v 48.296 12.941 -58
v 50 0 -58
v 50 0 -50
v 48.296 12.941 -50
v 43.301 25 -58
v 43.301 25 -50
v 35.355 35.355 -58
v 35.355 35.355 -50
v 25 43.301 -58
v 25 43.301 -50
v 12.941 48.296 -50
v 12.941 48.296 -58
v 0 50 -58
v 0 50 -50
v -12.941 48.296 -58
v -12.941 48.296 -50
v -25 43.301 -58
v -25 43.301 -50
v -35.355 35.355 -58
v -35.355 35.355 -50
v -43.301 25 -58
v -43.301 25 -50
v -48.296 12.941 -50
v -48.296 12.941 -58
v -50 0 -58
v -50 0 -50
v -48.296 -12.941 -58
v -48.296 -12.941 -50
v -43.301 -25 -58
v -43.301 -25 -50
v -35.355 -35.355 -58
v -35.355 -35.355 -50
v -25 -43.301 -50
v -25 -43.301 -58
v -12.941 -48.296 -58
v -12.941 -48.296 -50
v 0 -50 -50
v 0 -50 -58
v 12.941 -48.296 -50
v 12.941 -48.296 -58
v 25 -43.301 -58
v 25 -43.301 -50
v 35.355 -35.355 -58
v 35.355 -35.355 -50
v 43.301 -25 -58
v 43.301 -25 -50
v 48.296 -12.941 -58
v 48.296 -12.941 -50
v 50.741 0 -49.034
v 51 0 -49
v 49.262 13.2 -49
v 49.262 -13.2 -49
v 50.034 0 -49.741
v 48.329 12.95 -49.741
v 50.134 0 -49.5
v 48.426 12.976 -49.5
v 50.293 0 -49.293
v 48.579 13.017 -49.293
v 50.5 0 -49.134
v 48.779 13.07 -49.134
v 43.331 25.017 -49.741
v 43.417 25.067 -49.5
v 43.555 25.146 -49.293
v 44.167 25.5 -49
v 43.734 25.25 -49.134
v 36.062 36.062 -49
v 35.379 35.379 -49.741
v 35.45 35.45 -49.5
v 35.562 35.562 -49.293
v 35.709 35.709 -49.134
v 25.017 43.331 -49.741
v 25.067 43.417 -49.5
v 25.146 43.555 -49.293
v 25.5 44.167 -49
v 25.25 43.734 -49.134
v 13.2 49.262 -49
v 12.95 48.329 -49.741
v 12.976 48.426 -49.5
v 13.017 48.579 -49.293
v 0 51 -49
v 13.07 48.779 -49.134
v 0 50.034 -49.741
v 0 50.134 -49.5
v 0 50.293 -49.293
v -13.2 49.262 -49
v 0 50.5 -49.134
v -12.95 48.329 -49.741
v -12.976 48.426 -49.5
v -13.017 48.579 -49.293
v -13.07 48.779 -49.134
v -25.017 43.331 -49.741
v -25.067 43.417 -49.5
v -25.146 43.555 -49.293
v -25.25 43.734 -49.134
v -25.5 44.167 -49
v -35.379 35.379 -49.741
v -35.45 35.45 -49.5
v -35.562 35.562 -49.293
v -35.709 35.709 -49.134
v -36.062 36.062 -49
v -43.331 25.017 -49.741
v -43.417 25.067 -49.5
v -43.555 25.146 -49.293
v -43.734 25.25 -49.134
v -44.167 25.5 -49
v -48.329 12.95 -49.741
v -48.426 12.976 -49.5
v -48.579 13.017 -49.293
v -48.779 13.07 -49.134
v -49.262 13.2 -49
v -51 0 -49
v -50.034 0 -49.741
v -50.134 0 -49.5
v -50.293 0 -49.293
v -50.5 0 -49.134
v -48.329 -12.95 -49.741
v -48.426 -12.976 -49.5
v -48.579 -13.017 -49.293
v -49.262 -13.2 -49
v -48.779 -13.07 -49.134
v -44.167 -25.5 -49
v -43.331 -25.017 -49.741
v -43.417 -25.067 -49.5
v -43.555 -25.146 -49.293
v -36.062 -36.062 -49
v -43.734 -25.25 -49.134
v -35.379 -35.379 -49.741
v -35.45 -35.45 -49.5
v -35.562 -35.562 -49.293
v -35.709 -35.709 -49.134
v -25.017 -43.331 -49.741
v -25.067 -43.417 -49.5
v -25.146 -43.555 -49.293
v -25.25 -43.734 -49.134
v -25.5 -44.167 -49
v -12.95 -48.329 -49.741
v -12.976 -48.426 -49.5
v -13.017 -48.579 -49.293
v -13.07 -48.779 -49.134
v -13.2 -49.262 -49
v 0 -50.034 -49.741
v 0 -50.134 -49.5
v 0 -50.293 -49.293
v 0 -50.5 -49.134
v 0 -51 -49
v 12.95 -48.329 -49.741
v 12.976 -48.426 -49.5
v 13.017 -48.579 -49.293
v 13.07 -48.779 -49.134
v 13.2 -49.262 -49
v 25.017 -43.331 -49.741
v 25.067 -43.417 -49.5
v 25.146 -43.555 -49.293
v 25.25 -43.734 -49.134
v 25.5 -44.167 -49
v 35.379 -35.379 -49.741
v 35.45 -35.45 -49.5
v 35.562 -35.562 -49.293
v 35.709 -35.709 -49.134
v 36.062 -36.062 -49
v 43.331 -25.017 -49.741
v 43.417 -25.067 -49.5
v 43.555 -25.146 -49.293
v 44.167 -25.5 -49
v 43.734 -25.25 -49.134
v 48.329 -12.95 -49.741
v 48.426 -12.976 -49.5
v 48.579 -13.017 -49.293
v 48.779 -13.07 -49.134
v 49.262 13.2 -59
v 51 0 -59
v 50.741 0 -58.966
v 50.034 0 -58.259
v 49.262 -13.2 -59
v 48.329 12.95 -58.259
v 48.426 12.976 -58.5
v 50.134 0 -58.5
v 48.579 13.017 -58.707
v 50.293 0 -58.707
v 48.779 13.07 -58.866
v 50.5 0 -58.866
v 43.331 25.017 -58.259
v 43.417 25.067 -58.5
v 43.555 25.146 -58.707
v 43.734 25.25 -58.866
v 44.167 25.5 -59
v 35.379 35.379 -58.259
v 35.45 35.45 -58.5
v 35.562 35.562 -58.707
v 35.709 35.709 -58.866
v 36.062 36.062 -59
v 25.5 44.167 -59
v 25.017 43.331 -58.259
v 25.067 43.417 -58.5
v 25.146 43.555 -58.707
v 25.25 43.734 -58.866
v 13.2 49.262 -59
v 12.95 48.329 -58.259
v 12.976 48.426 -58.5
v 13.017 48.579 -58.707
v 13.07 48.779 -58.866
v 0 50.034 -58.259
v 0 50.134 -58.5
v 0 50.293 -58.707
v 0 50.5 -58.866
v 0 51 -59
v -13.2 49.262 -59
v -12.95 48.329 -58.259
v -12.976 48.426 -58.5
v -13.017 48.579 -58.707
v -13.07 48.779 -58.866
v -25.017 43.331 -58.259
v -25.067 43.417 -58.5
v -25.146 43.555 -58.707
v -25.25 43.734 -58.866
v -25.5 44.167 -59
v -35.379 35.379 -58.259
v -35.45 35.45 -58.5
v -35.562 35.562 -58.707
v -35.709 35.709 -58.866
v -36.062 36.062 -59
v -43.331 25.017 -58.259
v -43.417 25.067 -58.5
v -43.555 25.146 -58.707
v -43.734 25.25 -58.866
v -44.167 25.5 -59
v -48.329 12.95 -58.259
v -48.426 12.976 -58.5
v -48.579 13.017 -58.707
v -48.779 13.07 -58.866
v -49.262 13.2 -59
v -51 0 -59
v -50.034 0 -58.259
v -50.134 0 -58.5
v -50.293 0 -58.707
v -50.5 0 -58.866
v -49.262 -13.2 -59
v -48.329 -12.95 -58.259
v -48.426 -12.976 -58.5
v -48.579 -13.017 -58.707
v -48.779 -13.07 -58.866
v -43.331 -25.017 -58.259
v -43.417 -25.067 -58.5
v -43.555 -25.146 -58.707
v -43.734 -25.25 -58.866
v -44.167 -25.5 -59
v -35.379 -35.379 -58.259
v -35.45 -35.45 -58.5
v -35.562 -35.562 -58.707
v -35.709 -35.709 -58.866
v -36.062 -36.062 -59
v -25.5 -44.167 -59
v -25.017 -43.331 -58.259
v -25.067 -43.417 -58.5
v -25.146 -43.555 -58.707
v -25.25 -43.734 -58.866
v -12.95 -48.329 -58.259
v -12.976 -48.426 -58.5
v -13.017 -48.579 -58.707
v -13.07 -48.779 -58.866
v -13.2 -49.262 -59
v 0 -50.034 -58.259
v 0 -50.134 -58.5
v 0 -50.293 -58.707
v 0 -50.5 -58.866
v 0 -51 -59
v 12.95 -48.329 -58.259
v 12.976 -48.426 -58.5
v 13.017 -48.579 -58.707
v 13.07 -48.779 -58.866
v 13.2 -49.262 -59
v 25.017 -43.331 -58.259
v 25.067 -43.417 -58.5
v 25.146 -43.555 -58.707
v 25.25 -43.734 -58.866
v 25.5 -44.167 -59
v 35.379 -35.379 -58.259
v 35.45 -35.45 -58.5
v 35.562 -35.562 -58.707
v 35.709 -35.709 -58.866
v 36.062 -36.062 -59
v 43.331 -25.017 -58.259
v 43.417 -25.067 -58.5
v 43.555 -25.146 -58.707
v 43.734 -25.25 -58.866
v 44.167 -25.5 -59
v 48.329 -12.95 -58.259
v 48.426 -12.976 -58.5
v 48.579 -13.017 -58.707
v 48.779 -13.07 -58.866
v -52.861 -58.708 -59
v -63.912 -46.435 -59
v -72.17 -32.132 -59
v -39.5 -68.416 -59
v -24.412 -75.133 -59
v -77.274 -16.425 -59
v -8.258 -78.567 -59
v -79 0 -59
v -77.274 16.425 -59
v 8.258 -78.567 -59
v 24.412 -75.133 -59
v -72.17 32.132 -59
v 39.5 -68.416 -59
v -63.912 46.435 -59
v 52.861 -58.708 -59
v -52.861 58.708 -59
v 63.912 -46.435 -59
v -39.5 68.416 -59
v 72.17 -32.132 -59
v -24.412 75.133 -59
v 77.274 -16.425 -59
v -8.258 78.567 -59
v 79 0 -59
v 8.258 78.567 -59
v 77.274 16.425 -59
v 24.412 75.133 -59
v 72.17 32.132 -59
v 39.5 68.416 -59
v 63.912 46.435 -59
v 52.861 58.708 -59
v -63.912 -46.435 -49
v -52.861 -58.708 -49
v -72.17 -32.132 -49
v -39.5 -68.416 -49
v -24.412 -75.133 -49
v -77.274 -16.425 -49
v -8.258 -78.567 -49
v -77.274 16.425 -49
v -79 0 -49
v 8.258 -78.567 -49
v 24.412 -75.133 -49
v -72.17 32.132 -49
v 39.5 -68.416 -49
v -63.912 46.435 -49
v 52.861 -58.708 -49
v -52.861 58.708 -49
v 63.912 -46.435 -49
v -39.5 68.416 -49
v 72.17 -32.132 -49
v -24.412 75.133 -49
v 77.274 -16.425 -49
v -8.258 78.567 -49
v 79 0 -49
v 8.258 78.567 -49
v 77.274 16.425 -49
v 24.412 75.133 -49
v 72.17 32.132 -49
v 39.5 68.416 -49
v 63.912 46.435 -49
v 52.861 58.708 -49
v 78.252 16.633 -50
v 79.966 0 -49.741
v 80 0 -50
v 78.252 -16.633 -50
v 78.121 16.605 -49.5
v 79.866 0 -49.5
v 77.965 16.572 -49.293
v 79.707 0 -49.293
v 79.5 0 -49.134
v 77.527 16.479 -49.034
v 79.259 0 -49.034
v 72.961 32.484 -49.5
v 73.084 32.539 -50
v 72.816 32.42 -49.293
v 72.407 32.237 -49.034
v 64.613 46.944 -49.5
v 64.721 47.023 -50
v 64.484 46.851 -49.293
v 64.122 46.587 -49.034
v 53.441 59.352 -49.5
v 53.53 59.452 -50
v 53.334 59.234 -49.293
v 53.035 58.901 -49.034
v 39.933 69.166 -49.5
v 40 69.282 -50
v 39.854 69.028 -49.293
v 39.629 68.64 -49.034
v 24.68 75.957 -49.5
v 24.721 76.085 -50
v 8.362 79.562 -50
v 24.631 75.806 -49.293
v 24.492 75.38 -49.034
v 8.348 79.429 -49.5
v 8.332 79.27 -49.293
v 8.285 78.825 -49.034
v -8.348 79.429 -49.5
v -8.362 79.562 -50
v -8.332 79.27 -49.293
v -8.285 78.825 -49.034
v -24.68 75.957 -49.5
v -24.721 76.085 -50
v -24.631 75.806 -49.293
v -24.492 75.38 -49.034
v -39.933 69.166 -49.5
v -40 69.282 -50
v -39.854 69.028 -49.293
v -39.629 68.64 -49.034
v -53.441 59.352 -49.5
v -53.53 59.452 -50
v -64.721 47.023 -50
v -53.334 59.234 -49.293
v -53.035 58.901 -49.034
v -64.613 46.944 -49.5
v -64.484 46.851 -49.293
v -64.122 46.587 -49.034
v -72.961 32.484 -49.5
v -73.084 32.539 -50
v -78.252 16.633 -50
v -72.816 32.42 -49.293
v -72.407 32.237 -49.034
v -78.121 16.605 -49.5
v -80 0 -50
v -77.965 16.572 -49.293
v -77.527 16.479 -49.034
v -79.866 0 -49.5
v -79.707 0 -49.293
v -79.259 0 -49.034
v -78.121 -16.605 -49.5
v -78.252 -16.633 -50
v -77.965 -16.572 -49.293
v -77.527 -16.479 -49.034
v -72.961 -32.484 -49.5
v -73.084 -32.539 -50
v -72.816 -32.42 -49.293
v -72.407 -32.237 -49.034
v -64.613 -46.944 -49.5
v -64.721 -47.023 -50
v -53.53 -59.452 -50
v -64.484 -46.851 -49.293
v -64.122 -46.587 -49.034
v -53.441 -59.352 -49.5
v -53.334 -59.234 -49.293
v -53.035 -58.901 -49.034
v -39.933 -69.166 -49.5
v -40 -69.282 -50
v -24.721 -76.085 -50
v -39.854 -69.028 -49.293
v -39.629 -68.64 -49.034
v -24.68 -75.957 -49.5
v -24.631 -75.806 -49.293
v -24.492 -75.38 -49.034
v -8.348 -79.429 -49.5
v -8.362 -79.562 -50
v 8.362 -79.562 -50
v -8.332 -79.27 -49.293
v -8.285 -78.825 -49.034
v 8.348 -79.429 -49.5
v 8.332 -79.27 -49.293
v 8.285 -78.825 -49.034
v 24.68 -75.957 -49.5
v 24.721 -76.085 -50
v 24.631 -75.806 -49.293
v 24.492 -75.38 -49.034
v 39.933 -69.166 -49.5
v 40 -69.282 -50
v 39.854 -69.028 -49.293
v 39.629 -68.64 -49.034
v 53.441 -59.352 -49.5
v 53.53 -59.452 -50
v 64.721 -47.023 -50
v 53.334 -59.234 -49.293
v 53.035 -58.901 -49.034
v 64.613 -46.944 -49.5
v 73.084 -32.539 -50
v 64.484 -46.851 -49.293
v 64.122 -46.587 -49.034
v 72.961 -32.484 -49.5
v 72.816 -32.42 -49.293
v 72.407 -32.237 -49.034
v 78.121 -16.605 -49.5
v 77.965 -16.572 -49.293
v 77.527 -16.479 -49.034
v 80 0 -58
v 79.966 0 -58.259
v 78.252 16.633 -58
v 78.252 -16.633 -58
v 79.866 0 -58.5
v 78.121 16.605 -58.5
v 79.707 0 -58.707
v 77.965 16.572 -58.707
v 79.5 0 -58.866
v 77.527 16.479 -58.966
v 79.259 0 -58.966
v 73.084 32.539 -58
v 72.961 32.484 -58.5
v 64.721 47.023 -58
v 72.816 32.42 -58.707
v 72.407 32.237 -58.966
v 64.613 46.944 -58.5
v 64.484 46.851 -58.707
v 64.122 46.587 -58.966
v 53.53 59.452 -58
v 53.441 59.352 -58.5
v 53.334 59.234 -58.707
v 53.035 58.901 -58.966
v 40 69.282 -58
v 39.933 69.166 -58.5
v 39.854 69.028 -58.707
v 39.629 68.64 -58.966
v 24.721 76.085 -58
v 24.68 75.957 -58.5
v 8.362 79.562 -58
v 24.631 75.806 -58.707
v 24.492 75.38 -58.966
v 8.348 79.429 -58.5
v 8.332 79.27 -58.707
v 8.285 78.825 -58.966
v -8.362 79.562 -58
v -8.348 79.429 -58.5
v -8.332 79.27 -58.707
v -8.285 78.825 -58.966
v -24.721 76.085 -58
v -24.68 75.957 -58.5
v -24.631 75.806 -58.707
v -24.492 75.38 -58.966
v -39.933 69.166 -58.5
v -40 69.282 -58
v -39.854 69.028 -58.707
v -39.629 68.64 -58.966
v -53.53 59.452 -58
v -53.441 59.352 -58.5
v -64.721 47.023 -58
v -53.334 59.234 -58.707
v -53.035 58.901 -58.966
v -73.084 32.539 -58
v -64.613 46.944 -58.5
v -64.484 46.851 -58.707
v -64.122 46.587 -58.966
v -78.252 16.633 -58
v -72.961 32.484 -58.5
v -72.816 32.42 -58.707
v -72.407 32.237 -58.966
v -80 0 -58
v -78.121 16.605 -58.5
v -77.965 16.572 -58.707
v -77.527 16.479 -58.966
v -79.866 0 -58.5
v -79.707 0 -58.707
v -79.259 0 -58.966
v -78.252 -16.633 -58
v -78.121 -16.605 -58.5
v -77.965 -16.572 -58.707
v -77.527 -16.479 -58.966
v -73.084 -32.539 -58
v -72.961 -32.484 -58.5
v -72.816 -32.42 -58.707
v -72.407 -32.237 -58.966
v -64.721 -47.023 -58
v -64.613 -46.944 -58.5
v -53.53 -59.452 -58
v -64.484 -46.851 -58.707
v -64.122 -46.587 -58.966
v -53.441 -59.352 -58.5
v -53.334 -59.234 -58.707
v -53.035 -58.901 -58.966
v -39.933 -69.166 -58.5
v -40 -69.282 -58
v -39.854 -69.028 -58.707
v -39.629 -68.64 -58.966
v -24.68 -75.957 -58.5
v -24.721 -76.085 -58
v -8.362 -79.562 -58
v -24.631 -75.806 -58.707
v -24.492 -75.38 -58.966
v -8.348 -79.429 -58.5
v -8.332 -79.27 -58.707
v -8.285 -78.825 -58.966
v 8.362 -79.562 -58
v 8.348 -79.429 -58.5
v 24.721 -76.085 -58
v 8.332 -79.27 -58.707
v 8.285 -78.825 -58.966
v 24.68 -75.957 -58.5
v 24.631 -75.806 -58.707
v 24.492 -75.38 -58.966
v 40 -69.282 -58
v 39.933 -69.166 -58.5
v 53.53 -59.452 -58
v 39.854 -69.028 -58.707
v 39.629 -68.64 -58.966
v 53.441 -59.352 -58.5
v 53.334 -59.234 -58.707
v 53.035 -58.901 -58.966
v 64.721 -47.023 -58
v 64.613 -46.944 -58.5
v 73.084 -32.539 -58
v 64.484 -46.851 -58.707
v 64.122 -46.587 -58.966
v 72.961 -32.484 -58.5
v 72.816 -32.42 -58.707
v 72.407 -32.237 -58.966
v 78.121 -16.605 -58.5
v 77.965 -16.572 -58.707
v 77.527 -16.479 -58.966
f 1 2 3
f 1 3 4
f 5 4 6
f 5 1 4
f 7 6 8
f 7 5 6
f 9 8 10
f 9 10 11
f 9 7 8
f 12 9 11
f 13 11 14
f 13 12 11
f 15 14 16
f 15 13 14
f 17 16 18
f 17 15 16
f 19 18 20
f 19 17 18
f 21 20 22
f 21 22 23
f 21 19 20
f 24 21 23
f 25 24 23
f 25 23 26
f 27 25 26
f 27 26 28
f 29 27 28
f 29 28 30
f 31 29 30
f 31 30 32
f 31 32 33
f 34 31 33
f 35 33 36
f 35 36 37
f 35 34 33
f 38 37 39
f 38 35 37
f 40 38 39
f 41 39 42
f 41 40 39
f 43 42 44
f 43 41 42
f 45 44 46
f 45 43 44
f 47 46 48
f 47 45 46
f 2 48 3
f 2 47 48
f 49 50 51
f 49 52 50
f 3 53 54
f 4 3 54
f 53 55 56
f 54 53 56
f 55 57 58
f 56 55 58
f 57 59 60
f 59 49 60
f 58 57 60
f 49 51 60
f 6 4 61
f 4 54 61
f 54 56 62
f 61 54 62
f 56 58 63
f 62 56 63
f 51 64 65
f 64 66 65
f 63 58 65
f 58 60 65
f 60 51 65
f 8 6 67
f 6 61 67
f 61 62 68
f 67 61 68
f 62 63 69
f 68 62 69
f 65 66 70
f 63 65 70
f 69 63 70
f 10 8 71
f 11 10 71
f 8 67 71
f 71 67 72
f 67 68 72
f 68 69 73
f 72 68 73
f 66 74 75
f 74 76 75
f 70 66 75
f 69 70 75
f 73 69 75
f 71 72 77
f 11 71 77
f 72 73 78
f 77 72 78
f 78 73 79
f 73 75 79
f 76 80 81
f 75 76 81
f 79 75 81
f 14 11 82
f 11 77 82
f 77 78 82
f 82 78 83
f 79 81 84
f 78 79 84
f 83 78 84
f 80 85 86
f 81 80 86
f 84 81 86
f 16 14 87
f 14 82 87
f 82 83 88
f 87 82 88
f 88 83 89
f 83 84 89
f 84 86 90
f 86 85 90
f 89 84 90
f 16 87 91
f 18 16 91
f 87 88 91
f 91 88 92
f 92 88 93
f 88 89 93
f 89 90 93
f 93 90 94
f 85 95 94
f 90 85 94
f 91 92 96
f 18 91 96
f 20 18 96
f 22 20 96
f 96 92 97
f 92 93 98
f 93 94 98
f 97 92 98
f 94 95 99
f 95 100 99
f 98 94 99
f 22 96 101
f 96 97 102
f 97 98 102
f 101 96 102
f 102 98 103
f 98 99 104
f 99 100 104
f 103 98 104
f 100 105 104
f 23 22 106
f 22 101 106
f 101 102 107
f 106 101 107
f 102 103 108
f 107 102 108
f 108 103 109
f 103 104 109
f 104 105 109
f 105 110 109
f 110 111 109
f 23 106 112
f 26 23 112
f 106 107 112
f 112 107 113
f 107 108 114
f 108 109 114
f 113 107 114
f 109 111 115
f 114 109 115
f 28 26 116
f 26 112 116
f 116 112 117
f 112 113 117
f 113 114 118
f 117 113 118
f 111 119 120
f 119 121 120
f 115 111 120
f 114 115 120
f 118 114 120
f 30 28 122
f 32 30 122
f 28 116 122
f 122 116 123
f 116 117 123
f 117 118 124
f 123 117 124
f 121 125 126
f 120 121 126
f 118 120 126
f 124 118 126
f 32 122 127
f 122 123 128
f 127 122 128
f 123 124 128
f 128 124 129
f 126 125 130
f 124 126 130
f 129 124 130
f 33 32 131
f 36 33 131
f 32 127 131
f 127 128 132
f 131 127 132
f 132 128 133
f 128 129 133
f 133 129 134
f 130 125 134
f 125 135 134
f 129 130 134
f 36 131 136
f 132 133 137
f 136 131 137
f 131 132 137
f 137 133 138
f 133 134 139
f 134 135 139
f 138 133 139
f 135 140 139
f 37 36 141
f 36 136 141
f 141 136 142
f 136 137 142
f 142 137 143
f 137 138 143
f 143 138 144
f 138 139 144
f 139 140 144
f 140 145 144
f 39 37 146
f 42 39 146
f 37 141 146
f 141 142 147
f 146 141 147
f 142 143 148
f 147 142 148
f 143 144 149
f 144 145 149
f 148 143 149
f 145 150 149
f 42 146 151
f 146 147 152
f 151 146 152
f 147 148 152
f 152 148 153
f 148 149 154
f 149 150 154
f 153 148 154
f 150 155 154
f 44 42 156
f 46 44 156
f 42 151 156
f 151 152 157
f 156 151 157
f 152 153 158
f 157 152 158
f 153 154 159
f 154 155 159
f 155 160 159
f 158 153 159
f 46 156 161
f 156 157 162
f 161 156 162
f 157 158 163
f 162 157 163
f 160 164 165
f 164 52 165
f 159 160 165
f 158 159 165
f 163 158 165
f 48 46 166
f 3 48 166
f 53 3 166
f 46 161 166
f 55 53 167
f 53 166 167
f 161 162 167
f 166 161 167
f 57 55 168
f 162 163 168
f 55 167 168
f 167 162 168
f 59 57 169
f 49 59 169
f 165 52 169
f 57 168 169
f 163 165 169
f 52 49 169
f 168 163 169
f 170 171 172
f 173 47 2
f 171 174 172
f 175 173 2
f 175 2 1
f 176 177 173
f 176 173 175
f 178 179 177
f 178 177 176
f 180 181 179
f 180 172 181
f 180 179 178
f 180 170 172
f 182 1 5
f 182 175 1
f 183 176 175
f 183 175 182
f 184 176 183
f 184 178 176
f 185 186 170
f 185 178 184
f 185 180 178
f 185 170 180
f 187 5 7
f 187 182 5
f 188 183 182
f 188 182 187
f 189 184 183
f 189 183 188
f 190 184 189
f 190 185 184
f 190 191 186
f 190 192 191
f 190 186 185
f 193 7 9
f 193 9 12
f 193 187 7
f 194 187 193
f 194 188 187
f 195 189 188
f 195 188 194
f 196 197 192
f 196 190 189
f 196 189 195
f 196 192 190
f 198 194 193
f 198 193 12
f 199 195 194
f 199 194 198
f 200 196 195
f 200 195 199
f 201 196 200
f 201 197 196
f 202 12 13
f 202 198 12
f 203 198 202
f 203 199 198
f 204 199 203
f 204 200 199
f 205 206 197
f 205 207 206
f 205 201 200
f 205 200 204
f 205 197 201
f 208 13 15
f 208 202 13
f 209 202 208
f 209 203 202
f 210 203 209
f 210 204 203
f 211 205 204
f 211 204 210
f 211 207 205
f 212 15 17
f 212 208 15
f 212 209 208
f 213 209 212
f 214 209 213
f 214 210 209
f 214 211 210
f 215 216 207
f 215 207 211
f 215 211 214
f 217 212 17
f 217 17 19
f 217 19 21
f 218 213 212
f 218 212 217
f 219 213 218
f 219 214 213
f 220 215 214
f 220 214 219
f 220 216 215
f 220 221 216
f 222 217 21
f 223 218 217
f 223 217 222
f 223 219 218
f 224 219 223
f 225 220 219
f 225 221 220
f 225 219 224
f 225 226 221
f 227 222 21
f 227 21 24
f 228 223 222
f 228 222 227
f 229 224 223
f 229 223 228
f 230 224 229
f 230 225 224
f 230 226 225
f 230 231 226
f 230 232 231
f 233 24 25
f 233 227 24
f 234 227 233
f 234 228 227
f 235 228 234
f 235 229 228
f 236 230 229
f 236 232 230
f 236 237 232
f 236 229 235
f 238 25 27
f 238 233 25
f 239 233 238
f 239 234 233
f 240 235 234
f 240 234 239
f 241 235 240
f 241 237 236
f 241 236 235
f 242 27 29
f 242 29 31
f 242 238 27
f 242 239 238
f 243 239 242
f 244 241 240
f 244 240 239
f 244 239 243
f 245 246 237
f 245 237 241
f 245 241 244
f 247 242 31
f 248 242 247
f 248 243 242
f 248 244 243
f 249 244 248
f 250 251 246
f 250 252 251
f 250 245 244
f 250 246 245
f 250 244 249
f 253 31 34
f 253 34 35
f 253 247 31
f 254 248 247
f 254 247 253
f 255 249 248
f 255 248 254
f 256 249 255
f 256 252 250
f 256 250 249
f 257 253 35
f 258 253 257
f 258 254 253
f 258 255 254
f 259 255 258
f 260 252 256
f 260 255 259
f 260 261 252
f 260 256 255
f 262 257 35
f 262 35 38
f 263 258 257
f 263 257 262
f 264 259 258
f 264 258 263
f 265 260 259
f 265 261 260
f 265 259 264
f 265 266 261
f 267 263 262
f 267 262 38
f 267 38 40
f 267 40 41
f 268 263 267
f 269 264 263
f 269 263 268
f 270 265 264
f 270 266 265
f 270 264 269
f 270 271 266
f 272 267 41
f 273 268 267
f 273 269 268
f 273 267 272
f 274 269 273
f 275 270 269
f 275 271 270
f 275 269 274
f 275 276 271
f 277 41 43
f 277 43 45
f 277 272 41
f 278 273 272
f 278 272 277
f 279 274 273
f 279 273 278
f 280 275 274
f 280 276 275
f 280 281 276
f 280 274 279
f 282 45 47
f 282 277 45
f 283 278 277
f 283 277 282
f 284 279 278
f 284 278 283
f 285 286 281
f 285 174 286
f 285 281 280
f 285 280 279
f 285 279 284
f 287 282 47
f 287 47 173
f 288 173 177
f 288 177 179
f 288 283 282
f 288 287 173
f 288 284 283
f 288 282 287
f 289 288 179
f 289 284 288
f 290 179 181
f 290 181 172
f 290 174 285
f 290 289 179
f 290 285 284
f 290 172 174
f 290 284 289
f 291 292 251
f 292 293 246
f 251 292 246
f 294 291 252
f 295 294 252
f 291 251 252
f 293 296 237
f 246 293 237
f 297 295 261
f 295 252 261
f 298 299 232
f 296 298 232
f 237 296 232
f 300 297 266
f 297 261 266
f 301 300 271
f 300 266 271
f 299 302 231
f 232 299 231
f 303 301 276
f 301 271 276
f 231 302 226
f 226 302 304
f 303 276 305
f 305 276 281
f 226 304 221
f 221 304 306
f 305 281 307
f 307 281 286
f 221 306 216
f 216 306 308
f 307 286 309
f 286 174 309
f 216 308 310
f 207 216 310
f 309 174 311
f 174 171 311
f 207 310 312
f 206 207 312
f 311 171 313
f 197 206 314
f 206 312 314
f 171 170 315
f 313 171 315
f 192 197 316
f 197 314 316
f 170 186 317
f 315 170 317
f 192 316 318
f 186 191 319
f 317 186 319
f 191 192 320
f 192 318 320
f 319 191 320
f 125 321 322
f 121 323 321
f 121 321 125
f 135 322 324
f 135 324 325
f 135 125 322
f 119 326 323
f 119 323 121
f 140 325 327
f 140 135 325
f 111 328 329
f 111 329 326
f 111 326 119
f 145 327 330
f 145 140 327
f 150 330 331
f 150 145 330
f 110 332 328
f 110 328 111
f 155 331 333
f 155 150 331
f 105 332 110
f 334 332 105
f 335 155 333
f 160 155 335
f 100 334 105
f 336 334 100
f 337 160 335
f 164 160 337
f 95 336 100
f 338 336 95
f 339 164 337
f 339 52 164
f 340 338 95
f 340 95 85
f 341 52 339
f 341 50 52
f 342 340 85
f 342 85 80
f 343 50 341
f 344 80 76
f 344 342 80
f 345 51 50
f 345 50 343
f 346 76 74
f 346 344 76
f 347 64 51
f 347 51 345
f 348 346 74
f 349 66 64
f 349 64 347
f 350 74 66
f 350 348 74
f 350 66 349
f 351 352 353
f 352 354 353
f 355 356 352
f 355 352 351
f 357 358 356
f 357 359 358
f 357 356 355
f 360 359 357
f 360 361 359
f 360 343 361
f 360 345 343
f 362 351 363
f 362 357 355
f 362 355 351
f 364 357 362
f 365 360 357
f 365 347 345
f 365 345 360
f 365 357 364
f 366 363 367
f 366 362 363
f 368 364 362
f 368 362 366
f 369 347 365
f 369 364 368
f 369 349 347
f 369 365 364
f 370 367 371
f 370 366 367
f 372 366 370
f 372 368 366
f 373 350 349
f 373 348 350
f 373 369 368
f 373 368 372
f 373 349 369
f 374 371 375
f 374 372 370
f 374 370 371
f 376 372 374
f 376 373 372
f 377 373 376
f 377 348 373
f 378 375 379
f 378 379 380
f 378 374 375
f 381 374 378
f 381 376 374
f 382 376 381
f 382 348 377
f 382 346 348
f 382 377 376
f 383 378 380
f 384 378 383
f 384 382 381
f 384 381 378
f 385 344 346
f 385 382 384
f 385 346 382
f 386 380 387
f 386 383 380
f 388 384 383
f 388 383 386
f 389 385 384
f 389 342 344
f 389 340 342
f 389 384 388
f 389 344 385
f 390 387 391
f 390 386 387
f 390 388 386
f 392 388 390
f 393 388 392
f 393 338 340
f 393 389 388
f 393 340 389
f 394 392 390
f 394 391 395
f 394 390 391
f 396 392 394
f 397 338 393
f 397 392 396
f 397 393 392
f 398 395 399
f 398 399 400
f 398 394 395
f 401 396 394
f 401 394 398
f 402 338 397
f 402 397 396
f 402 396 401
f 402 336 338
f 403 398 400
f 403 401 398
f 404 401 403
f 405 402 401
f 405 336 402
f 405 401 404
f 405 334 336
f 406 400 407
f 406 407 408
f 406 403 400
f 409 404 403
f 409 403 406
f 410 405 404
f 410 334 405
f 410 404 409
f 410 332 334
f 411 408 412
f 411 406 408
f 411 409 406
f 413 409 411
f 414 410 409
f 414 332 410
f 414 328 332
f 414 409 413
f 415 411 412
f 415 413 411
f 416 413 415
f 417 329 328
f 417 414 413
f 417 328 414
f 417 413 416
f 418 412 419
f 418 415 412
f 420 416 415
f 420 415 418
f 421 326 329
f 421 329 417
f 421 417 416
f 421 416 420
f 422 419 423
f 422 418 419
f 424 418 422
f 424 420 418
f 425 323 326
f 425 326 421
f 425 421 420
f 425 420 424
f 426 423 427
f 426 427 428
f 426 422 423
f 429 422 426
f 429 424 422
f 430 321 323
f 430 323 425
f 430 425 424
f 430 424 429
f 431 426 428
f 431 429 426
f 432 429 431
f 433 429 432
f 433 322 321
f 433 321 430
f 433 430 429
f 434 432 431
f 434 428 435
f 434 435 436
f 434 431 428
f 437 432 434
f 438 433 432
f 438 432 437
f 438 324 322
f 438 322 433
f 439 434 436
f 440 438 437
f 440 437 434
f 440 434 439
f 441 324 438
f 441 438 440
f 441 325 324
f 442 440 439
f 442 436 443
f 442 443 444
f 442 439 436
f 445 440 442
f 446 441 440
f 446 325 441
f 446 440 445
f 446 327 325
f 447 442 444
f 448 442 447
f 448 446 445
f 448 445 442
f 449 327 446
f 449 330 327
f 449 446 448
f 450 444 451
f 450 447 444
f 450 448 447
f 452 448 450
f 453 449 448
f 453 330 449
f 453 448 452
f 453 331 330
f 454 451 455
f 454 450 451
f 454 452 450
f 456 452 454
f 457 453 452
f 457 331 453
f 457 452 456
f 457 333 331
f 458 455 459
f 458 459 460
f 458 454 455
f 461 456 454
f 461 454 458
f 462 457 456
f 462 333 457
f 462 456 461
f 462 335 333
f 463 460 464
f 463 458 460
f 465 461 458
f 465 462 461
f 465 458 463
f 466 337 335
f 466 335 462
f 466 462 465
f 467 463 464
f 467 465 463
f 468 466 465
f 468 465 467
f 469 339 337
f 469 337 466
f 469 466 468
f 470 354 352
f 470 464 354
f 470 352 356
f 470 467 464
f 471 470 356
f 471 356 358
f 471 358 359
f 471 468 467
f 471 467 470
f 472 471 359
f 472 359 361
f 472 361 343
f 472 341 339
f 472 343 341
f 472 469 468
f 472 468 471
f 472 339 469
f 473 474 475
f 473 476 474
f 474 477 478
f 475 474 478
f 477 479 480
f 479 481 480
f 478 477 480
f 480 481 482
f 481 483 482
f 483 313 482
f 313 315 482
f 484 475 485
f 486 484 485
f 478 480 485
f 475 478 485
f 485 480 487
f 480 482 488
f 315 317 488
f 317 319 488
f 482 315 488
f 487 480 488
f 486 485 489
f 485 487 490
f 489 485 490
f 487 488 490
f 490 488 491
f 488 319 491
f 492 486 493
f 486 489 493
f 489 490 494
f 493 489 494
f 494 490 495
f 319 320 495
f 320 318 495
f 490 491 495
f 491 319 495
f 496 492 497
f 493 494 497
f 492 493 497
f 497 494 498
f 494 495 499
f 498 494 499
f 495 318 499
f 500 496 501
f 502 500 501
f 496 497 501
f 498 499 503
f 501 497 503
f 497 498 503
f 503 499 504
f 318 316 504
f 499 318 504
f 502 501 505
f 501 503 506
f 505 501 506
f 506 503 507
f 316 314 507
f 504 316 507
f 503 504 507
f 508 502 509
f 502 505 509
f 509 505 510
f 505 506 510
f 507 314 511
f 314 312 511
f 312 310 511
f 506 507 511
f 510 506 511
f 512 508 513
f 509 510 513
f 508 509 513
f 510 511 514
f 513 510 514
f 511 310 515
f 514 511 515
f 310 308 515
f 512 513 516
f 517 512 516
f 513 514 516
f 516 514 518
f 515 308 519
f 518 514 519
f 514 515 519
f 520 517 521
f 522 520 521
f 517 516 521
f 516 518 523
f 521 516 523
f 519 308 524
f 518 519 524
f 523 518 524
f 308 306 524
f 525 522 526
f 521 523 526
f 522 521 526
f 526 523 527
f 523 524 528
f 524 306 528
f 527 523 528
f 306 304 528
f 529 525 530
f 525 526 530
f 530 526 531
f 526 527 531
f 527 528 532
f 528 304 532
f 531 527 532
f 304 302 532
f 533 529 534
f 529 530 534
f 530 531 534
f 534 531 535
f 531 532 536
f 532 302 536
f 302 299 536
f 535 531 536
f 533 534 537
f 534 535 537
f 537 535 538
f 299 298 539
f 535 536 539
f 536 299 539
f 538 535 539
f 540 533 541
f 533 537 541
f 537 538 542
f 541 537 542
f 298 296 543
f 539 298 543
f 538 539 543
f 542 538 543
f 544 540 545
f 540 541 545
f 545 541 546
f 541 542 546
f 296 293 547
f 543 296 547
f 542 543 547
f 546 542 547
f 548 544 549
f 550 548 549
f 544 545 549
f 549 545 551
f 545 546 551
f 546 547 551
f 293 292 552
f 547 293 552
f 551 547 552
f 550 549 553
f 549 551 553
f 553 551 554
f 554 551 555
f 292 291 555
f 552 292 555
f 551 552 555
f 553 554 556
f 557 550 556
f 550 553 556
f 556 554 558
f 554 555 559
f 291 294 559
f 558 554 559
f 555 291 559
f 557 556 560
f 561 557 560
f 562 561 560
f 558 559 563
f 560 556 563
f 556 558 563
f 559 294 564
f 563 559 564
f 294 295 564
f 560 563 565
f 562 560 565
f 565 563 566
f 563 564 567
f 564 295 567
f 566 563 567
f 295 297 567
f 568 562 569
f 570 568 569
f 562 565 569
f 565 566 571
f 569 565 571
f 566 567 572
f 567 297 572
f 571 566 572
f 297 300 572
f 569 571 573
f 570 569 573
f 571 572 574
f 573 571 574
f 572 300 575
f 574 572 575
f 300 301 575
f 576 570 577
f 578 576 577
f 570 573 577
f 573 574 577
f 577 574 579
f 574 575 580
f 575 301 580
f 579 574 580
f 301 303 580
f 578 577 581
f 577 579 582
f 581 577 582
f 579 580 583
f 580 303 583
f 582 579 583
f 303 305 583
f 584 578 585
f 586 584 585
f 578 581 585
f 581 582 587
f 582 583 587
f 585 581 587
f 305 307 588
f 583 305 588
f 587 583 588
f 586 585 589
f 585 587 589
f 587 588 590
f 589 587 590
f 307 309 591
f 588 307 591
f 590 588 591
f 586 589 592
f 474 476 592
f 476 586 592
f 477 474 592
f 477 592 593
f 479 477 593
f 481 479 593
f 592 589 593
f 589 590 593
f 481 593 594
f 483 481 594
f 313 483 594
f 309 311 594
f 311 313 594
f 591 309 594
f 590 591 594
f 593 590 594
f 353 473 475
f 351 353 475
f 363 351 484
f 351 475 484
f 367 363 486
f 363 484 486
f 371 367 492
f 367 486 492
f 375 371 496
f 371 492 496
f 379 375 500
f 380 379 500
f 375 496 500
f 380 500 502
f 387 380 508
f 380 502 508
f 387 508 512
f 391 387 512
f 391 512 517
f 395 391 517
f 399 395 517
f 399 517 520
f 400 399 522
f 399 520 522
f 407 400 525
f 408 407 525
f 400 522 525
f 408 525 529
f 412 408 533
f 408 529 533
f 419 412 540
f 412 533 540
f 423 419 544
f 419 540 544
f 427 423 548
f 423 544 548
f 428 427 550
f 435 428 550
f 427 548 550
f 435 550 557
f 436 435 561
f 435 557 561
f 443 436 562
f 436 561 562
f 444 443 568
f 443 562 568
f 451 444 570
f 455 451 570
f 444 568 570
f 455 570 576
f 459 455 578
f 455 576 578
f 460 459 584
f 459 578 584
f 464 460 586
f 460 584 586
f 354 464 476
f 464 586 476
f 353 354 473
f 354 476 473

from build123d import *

# Parameters (mm, degrees)
SKETCH001_R   = 80
SKETCH001_R_2 = 50
PAD001_DEPTH  = 10
FILLET001_R   = 1


with BuildPart() as part:
    # Sketch001 → Pad001 (new body)
    with BuildSketch(Plane.XY):
        Circle(SKETCH001_R)
        Circle(SKETCH001_R_2, mode=Mode.SUBTRACT)
    extrude(amount=PAD001_DEPTH)

    # Fillet001
    fillet001_edges = [part.edges().sort_by_distance(p)[0] for p in [
        (-80, 0, 10),
        (-80, 0, 0),
        (-50, 0, 10),
        (-50, 0, 0),
    ]]
    fillet(fillet001_edges, radius=FILLET001_R)


with BuildPart() as part_1:
    # Body001 placement: moved
    add(part.part.moved(Location((0, 0, -59))))


solid = part_1.part
